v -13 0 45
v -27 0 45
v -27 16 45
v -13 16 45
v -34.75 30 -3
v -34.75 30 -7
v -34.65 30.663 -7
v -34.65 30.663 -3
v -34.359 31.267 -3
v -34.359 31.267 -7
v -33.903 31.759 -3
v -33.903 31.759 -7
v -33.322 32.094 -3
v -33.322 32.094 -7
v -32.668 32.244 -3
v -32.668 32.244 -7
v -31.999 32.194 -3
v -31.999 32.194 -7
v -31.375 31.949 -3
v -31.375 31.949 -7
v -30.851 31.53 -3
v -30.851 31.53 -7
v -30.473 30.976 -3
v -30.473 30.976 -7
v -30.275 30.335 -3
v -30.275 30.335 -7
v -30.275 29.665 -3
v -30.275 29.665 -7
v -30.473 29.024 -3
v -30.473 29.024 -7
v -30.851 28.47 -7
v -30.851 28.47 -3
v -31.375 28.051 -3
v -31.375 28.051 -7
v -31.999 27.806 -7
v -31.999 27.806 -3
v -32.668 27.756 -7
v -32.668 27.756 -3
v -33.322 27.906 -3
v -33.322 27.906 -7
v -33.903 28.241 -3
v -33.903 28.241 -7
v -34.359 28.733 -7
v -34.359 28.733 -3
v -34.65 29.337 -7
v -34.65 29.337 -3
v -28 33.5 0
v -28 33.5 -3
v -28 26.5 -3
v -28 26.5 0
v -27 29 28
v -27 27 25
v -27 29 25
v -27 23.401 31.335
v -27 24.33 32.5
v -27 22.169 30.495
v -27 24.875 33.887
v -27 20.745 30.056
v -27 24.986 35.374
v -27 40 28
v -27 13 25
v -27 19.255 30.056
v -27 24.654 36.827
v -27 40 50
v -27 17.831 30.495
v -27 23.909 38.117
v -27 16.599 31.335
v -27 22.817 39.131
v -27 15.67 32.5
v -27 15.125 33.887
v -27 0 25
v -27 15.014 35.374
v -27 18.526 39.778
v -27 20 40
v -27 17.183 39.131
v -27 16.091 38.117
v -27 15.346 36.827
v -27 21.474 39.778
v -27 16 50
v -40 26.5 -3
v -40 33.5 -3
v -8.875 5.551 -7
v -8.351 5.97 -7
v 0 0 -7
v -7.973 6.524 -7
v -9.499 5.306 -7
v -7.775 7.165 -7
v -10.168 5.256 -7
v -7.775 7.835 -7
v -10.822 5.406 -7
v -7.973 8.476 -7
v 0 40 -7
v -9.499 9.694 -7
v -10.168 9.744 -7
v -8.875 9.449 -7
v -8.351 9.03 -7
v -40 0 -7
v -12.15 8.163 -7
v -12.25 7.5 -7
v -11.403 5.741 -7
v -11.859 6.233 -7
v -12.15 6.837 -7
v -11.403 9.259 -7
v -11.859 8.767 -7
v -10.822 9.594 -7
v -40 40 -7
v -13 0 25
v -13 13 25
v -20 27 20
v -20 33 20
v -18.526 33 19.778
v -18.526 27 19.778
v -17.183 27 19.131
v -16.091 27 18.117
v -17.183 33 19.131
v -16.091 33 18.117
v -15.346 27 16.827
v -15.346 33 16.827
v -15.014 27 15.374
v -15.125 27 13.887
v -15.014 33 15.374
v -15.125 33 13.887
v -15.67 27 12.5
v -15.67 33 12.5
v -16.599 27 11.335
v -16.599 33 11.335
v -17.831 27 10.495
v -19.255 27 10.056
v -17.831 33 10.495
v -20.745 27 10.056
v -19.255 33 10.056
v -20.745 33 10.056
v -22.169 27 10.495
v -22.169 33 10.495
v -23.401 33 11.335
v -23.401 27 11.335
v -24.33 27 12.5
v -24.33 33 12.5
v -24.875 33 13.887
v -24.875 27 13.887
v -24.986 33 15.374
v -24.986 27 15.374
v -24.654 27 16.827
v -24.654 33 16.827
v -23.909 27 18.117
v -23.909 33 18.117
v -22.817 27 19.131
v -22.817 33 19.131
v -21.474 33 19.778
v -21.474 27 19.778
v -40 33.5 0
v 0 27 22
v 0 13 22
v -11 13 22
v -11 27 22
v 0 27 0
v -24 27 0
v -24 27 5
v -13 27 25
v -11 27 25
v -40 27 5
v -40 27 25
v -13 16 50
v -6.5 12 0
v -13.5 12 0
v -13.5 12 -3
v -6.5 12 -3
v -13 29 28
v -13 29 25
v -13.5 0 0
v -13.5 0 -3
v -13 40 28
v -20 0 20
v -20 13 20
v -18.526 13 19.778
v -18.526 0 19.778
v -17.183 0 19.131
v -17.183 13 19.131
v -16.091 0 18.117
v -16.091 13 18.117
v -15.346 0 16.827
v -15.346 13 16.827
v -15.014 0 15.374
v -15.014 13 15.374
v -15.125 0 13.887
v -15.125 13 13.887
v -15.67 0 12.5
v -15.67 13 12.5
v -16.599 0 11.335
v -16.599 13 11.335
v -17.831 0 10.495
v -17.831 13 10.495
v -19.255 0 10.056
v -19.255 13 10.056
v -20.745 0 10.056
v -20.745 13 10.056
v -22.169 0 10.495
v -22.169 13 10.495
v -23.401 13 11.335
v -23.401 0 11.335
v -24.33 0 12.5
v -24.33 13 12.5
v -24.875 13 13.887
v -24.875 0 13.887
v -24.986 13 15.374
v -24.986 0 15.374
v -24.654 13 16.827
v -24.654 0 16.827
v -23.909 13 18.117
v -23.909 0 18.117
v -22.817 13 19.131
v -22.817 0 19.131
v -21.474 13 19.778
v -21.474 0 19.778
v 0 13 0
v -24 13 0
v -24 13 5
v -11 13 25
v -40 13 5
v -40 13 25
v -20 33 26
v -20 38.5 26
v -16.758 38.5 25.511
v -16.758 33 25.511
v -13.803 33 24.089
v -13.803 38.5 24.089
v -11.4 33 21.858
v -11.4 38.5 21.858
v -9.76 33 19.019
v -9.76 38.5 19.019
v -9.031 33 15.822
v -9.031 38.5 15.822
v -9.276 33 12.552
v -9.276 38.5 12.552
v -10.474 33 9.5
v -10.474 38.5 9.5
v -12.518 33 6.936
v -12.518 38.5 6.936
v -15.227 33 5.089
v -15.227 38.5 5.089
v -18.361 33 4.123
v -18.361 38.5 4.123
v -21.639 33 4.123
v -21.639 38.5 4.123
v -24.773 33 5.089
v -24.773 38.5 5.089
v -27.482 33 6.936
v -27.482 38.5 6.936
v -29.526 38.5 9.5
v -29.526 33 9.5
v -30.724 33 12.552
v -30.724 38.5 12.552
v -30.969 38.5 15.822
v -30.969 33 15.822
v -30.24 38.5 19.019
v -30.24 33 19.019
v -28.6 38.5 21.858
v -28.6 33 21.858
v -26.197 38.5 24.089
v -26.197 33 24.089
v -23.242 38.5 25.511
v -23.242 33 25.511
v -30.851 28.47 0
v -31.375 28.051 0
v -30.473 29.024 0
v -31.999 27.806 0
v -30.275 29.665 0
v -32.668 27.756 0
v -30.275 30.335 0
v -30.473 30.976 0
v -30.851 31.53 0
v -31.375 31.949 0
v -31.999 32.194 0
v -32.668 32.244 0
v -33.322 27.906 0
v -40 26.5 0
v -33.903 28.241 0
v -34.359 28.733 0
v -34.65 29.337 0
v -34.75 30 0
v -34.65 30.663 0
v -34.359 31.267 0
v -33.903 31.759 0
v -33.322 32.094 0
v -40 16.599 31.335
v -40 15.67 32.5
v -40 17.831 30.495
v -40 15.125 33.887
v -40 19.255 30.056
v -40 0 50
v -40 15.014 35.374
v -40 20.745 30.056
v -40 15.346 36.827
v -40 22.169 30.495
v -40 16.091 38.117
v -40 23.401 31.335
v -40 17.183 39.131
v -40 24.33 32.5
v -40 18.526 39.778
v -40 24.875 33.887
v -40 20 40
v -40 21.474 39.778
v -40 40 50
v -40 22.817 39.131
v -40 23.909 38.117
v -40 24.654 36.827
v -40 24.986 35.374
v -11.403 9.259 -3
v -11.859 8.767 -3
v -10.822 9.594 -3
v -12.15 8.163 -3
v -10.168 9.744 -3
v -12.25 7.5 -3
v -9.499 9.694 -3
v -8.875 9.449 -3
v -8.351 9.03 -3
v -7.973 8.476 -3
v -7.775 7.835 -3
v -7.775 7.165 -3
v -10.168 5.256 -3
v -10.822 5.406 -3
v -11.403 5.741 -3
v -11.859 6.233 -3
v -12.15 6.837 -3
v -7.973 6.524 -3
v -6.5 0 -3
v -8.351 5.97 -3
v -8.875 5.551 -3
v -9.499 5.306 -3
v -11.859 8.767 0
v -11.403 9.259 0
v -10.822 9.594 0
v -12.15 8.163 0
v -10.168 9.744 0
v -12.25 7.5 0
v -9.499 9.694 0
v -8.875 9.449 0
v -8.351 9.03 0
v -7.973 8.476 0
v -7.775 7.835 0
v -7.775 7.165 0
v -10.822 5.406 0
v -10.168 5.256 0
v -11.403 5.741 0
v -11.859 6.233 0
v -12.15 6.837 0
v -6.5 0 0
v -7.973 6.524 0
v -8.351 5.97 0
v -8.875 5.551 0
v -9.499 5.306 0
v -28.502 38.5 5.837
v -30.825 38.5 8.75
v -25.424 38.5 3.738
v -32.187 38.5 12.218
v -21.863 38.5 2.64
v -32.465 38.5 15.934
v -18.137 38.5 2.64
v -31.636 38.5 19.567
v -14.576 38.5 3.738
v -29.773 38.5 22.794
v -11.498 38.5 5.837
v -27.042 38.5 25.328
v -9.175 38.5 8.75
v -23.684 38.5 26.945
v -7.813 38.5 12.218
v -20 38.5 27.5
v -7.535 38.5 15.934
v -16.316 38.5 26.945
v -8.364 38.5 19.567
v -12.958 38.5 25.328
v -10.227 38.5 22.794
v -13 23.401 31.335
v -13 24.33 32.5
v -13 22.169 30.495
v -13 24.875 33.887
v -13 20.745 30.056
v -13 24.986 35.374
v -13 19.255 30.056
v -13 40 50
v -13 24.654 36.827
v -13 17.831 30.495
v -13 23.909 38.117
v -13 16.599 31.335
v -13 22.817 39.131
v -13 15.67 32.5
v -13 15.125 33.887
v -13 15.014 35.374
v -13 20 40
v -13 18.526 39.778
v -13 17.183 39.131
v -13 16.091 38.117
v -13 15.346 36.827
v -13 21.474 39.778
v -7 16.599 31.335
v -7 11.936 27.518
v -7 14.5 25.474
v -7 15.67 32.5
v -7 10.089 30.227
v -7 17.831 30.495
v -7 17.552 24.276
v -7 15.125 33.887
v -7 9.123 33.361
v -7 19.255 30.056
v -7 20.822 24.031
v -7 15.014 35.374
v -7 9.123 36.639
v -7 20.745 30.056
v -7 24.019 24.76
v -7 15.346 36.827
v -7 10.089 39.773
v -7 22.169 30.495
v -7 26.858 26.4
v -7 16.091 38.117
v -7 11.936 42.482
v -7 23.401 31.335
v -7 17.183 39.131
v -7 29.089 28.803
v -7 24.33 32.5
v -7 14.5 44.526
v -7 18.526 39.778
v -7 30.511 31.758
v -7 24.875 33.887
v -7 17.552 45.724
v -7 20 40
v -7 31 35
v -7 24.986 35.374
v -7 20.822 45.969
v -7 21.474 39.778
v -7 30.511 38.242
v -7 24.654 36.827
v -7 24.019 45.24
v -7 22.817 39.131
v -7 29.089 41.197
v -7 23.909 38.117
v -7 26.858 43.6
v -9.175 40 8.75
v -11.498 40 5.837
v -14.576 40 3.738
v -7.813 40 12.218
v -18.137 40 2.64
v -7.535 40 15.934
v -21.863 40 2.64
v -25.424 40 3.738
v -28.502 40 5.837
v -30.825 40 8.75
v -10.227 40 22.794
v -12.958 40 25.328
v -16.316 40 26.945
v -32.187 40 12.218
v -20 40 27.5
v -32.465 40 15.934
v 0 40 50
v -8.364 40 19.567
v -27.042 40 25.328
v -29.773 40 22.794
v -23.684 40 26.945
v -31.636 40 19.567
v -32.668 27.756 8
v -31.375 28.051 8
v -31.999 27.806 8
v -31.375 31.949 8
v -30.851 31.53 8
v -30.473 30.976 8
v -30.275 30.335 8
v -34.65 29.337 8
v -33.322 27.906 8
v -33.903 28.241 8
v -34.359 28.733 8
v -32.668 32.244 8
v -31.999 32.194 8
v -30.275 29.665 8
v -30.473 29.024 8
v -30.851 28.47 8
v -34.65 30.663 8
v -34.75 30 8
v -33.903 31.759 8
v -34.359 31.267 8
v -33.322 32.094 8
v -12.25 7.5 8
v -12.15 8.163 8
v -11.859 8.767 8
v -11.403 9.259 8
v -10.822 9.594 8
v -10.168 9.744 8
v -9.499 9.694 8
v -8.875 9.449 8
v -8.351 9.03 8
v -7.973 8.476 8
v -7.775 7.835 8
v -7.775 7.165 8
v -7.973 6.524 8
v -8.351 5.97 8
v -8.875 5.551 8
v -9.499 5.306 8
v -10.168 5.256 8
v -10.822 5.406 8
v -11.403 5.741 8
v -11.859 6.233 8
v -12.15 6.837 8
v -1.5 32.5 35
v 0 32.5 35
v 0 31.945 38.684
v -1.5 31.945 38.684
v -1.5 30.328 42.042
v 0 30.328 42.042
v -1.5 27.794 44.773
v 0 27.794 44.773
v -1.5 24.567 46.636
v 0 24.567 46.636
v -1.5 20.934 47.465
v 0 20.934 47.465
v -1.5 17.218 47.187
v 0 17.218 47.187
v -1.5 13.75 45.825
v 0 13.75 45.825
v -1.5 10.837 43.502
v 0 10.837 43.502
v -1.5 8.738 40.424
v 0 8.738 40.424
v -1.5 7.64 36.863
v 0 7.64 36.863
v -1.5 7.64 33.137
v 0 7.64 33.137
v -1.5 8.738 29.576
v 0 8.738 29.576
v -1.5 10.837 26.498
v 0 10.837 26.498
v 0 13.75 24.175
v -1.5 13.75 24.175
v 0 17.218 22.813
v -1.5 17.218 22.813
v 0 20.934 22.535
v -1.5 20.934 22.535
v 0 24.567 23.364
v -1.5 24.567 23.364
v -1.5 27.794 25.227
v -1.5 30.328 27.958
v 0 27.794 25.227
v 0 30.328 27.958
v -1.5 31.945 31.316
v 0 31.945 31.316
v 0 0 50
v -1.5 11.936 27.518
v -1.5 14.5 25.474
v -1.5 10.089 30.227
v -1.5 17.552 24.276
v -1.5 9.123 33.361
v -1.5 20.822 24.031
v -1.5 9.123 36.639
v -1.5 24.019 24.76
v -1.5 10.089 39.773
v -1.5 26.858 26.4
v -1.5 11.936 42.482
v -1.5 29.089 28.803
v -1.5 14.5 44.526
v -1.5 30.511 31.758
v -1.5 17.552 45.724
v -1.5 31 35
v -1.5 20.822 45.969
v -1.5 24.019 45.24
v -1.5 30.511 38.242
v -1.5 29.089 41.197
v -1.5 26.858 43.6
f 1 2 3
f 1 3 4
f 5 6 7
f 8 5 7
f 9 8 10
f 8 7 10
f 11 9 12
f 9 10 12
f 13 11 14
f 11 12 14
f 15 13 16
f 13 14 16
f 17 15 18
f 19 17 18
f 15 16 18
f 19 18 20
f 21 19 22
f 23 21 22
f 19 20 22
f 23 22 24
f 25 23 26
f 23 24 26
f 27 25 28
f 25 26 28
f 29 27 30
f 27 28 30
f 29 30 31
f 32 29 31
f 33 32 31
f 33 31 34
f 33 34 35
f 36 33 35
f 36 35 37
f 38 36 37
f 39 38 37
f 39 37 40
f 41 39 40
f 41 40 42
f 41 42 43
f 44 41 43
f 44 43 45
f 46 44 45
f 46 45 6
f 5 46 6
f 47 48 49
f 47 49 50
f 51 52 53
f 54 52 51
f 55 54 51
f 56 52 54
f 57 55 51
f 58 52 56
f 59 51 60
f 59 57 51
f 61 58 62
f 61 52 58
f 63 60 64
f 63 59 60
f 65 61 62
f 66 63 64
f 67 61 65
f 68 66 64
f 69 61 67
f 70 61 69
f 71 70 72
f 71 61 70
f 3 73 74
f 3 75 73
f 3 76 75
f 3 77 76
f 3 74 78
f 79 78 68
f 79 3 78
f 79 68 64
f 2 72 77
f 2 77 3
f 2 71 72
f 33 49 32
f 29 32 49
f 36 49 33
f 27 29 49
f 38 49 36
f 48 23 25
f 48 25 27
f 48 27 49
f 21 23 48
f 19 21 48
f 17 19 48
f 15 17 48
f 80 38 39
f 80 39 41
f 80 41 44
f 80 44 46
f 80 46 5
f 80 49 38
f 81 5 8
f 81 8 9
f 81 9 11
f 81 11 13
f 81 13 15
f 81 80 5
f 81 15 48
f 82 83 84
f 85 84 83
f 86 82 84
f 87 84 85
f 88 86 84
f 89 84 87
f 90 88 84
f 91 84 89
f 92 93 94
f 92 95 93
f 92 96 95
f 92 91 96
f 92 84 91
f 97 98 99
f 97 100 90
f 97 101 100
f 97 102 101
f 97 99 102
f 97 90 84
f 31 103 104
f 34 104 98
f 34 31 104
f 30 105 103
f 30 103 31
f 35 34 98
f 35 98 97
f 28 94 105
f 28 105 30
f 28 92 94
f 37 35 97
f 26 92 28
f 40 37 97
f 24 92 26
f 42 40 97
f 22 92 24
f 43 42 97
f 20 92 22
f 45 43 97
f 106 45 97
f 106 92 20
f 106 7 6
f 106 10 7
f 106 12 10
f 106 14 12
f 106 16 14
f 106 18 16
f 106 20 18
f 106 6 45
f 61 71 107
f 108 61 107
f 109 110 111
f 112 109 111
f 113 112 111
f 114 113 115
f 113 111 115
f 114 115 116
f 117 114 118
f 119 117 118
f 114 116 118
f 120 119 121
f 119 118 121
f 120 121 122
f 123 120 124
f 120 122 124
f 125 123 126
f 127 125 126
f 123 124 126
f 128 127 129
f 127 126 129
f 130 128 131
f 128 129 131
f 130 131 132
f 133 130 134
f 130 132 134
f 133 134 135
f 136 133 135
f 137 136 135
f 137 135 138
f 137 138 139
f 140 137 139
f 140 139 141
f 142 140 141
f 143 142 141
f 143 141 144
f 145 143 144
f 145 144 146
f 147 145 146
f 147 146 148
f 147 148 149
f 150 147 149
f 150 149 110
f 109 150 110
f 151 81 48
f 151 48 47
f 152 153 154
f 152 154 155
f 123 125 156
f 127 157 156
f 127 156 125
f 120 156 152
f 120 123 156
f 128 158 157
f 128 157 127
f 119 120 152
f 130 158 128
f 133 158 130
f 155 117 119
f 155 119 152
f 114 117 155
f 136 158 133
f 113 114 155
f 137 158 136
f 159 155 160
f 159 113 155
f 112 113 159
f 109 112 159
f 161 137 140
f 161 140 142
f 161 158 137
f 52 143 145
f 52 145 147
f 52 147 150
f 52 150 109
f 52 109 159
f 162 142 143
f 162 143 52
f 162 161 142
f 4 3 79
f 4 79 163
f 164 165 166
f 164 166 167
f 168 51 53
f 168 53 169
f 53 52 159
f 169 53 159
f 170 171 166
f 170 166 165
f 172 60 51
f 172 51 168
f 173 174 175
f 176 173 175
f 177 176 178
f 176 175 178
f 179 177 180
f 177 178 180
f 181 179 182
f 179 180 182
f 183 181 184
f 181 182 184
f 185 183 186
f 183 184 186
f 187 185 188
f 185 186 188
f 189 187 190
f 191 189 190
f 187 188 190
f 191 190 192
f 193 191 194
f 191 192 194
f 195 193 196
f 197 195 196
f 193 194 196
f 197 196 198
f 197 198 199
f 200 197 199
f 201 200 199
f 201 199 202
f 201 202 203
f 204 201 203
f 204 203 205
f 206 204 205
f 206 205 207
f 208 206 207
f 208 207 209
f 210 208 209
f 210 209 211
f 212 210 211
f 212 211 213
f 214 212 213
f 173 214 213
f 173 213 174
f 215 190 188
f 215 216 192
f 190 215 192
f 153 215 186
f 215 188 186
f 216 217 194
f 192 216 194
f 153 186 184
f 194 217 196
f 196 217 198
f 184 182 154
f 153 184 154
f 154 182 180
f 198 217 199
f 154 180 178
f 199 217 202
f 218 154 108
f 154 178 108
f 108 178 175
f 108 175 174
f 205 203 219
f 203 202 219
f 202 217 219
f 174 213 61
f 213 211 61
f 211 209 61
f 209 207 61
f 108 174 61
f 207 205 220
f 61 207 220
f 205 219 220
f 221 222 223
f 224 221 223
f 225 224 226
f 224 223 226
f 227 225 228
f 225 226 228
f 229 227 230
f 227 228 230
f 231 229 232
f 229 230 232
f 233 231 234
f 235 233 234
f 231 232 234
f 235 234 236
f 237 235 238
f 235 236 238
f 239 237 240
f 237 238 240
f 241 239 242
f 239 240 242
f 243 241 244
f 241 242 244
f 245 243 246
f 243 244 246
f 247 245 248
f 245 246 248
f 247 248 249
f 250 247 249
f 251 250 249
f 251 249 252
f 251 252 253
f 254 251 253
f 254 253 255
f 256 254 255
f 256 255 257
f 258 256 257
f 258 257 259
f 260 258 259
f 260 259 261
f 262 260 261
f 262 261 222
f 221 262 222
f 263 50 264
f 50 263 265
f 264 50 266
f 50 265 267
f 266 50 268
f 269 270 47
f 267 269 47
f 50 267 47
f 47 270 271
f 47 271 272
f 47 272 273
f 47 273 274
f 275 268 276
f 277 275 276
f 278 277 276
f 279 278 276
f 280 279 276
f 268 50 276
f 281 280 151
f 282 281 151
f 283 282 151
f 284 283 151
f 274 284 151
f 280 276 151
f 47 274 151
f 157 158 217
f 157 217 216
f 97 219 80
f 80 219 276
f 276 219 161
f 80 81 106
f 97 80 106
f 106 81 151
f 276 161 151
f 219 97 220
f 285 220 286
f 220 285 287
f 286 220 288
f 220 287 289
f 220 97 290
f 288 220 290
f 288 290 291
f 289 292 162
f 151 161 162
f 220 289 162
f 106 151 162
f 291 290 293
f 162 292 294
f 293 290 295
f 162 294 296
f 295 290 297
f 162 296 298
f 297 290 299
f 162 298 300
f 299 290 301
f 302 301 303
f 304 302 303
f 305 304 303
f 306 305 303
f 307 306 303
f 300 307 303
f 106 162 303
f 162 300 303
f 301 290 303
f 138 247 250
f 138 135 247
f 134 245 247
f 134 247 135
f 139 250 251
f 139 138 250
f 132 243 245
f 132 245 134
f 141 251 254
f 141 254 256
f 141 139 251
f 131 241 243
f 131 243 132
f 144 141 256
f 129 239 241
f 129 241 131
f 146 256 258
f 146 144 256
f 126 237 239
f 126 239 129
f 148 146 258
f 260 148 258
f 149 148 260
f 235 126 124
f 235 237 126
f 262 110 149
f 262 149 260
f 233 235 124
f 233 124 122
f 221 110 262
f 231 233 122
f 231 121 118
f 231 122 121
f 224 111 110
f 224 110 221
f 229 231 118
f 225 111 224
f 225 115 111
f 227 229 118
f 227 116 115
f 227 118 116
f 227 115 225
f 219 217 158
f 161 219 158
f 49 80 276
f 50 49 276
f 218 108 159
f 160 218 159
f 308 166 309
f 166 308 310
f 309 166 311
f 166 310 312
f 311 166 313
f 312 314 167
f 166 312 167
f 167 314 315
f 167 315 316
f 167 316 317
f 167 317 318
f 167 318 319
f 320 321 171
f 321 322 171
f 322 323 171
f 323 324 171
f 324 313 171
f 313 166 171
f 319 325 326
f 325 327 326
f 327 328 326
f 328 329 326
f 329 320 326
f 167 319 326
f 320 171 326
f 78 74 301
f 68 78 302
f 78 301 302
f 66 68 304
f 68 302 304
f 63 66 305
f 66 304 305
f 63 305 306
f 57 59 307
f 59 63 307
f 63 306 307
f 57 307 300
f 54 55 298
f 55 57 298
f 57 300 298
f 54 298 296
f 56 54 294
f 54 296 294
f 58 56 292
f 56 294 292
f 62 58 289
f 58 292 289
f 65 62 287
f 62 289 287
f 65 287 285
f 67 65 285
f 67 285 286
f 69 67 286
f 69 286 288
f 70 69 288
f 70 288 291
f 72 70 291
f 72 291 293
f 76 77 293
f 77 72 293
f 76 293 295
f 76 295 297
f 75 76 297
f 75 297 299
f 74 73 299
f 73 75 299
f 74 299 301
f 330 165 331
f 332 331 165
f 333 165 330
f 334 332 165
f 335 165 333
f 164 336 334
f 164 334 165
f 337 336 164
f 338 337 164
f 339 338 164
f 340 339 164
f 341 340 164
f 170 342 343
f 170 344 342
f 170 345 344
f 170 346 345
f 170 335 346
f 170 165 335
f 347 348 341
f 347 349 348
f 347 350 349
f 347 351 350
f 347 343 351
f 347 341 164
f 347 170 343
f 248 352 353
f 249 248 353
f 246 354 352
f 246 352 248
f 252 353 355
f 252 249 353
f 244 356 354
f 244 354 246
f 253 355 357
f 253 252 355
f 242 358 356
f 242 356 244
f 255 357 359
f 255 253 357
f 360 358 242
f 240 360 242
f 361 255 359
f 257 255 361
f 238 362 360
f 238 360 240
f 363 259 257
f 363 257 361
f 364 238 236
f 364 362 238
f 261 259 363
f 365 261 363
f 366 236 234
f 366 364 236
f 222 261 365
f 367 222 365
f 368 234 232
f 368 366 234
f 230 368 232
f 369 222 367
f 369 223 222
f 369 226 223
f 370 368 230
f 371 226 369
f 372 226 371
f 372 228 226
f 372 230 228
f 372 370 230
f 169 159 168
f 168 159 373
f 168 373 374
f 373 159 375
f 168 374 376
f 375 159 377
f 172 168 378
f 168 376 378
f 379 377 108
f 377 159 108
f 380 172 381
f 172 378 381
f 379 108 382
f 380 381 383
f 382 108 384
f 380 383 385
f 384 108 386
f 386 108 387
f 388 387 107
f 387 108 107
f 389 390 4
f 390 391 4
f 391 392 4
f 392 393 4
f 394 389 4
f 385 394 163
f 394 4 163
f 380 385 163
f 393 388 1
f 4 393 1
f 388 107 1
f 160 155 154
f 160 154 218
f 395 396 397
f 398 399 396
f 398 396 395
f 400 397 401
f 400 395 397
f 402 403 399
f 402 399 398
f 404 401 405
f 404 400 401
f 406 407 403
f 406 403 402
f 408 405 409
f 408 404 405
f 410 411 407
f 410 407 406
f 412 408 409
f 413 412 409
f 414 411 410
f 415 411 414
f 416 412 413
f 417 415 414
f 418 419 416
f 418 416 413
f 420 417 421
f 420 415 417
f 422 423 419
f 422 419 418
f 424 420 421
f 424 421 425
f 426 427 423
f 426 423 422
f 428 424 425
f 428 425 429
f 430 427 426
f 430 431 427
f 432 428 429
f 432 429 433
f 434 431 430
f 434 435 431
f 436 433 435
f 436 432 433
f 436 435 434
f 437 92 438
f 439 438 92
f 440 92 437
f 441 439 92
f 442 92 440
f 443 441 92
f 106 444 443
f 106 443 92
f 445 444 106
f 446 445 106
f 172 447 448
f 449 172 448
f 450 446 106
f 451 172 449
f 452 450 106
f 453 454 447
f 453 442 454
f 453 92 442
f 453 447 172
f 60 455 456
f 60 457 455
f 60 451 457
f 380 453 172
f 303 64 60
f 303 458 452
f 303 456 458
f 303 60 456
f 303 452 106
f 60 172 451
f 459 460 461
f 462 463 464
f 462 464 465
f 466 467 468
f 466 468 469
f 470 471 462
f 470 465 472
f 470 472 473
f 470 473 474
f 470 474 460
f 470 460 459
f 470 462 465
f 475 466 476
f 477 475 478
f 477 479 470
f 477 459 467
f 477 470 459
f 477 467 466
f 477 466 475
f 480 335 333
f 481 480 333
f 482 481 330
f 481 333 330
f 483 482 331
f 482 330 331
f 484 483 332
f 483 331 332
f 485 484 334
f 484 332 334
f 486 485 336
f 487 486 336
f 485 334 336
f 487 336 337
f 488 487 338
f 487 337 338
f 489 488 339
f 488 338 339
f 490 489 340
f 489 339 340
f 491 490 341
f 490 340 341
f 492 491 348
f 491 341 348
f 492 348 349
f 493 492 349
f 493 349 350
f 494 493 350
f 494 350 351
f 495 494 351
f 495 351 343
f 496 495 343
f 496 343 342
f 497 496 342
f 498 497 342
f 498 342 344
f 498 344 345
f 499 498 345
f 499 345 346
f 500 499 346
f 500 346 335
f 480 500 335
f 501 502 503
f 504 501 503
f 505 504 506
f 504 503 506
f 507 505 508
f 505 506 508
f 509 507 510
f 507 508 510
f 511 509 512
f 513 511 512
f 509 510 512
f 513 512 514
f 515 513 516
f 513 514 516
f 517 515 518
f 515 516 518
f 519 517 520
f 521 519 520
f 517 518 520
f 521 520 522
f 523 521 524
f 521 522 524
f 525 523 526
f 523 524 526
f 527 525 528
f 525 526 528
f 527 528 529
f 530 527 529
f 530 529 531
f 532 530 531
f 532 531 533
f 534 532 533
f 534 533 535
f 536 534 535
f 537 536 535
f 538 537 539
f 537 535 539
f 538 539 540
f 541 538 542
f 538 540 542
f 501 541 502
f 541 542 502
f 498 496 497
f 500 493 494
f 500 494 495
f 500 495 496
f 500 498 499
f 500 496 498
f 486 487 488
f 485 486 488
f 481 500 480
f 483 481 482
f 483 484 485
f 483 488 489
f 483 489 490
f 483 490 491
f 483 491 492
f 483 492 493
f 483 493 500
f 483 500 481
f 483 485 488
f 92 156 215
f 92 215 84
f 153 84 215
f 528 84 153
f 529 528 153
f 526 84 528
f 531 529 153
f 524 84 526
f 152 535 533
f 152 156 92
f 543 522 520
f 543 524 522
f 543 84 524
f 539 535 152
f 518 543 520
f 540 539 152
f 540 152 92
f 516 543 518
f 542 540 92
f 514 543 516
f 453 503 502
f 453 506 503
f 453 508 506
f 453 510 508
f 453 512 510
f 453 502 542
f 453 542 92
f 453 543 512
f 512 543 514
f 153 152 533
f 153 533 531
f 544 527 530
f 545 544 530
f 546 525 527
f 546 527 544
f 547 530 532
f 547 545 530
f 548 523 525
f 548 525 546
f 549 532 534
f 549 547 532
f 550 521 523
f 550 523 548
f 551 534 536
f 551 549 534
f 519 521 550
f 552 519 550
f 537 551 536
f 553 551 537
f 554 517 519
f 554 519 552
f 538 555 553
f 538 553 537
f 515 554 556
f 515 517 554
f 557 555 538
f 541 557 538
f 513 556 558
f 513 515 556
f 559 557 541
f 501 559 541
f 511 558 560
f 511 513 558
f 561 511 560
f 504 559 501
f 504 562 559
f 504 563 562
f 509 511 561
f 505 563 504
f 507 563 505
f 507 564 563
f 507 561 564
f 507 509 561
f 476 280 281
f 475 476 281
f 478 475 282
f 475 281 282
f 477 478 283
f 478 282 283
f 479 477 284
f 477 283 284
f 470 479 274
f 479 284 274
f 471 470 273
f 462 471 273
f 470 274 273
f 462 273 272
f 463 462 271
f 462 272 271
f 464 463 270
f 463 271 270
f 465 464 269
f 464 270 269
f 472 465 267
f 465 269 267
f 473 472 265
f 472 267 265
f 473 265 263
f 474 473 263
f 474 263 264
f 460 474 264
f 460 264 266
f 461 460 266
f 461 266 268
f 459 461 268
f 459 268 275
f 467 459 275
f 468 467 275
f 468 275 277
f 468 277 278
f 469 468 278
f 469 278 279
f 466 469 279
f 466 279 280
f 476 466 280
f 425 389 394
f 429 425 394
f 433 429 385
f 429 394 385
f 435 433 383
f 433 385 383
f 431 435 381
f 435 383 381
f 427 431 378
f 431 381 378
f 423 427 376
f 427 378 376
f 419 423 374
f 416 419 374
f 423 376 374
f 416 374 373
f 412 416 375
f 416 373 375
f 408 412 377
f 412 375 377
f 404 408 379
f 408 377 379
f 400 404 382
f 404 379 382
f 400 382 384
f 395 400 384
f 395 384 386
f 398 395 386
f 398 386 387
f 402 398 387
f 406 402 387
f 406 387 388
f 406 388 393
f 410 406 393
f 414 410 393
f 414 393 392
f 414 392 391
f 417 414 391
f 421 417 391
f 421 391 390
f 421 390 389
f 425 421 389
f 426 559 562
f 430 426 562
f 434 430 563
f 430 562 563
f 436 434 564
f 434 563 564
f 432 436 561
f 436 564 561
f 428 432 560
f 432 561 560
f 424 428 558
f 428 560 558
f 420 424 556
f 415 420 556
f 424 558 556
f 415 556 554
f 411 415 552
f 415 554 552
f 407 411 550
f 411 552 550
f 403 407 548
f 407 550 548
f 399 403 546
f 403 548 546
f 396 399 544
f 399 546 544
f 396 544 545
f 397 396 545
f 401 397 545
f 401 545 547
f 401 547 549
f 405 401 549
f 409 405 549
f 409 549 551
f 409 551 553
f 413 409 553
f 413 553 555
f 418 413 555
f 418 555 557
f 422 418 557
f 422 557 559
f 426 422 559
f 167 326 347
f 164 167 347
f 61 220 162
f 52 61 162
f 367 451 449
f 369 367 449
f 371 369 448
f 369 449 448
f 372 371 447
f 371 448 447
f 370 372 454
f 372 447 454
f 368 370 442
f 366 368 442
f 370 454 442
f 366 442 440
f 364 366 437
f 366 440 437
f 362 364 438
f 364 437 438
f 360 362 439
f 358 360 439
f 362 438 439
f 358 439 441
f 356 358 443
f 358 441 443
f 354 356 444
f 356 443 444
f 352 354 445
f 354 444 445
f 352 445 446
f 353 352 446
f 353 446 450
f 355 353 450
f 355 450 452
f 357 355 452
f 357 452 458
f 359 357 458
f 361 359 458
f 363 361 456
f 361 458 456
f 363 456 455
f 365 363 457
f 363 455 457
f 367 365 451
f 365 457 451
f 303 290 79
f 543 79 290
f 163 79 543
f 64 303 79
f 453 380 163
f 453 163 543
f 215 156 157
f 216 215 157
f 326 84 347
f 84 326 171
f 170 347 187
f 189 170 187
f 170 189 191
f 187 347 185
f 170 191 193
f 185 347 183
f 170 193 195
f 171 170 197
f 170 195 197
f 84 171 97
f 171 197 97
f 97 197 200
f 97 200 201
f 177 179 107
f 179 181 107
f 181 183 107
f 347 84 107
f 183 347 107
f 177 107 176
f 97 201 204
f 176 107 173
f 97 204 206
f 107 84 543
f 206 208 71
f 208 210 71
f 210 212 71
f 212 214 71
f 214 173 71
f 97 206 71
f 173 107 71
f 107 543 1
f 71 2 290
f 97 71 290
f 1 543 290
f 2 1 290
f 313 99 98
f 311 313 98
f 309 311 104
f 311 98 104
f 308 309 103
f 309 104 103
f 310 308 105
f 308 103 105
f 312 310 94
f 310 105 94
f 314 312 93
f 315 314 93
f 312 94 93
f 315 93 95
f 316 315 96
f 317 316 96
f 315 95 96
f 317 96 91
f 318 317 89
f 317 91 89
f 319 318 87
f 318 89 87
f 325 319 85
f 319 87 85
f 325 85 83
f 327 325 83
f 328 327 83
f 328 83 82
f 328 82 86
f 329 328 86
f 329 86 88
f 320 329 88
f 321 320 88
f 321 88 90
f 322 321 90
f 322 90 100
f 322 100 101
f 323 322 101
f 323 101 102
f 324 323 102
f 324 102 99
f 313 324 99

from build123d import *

# Parameters (mm, degrees)
ESQUISSE1_W              = 40
ESQUISSE1_H              = 40
BOSS_EXTRU_1_DEPTH       = 50
ESQUISSE2_R              = 5
ENL_V_MAT_EXTRU_1_DEPTH  = 41
ESQUISSE3_R              = 5
ENL_V_MAT_EXTRU_2_DEPTH  = 41
ESQUISSE4_W              = 20
ESQUISSE4_H              = 14
ENL_V_MAT_EXTRU_3_DEPTH  = 29
ESQUISSE5_W              = 14
ESQUISSE5_H              = 20
ENL_V_MAT_EXTRU_4_DEPTH  = 29
ESQUISSE6_W              = 22
ESQUISSE6_H              = 14
ENL_V_MAT_EXTRU_5_DEPTH  = 24
ESQUISSE7_W              = 14
ESQUISSE7_H              = 22
ENL_V_MAT_EXTRU_6_DEPTH  = 24
ESQUISSE8_R              = 11
ENL_V_MAT_EXTRU_7_DEPTH  = 7
ESQUISSE9_R              = 12.5
ENL_V_MAT_EXTRU_8_DEPTH  = 1.5
ESQUISSE10_R             = 11
ENL_V_MAT_EXTRU_9_DEPTH  = 7
ESQUISSE11_R             = 12.5
ENL_V_MAT_EXTRU_10_DEPTH = 1.5
ESQUISSE12_W             = 40
ESQUISSE12_H             = 40
BOSS_EXTRU_2_DEPTH       = 7
ESQUISSE13_R             = 2.25
ENL_V_MAT_EXTRU_11_DEPTH = 15
ESQUISSE14_W             = 3
ESQUISSE14_H             = 7
ENL_V_MAT_EXTRU_12_DEPTH = 12
ESQUISSE15_W             = 7
ESQUISSE15_H             = 3
ENL_V_MAT_EXTRU_13_DEPTH = 12


with BuildPart() as part:
    # Esquisse1 → Boss.-Extru.1 (new body)
    with BuildSketch(Plane.XY):
        with Locations((-20, 20)):
            Rectangle(ESQUISSE1_W, ESQUISSE1_H)
    extrude(amount=BOSS_EXTRU_1_DEPTH)

    # Esquisse2 → Enlèv. mat.-Extru.1 (cut, through all)
    with BuildSketch(Plane(origin=(0, 40, 0), x_dir=(1, 0, 0), z_dir=(0, 1, 0))):
        with Locations(Location((-20, -15, 0), (0, 0, 270))):  # turned: the seam where the file's is
            Circle(ESQUISSE2_R)
    extrude(amount=-ENL_V_MAT_EXTRU_1_DEPTH, mode=Mode.SUBTRACT)

    # Esquisse3 → Enlèv. mat.-Extru.2 (cut, through all)
    with BuildSketch(Plane.ZY.offset(40)):
        with Locations((35, 20)):
            Circle(ESQUISSE3_R)
    extrude(amount=-ENL_V_MAT_EXTRU_2_DEPTH, mode=Mode.SUBTRACT)

    # Esquisse4 → Enlèv. mat.-Extru.3 (cut)
    with BuildSketch(Plane.ZY.offset(40)):
        with Locations((15, 20)):
            Rectangle(ESQUISSE4_W, ESQUISSE4_H)
    extrude(amount=-ENL_V_MAT_EXTRU_3_DEPTH, mode=Mode.SUBTRACT)

    # Esquisse5 → Enlèv. mat.-Extru.4 (cut)
    with BuildSketch(Plane.XZ):
        with Locations((-20, 35)):
            Rectangle(ESQUISSE5_W, ESQUISSE5_H)
    extrude(amount=-ENL_V_MAT_EXTRU_4_DEPTH, mode=Mode.SUBTRACT)

    # Esquisse6 → Enlèv. mat.-Extru.5 (cut)
    with BuildSketch(Plane(origin=(0, 0, 0), x_dir=(0, 0, -1), z_dir=(1, 0, 0))):
        with Locations((-11, 20)):
            Rectangle(ESQUISSE6_W, ESQUISSE6_H)
    extrude(amount=-ENL_V_MAT_EXTRU_5_DEPTH, mode=Mode.SUBTRACT)

    # Esquisse7 → Enlèv. mat.-Extru.6 (cut)
    with BuildSketch(Plane(origin=(0, 40, 0), x_dir=(1, 0, 0), z_dir=(0, 1, 0))):
        with Locations((-20, -39)):
            Rectangle(ESQUISSE7_W, ESQUISSE7_H)
    extrude(amount=-ENL_V_MAT_EXTRU_6_DEPTH, mode=Mode.SUBTRACT)

    # Esquisse8 → Enlèv. mat.-Extru.7 (cut)
    with BuildSketch(Plane(origin=(0, 0, 0), x_dir=(0, 0, -1), z_dir=(1, 0, 0))):
        with Locations(Location((-35, 20, 0), (0, 0, 90))):  # turned: the seam where the file's is
            Circle(ESQUISSE8_R)
    extrude(amount=-ENL_V_MAT_EXTRU_7_DEPTH, mode=Mode.SUBTRACT)

    # Esquisse9 → Enlèv. mat.-Extru.8 (cut)
    with BuildSketch(Plane(origin=(0, 0, 0), x_dir=(0, 0, -1), z_dir=(1, 0, 0))):
        with Locations(Location((-35, 20, 0), (0, 0, 90))):  # turned: the seam where the file's is
            Circle(ESQUISSE9_R)
    extrude(amount=-ENL_V_MAT_EXTRU_8_DEPTH, mode=Mode.SUBTRACT)

    # Esquisse10 → Enlèv. mat.-Extru.9 (cut)
    with BuildSketch(Plane(origin=(0, 40, 0), x_dir=(1, 0, 0), z_dir=(0, 1, 0))):
        with Locations(Location((-20, -15, 0), (0, 0, 270))):  # turned: the seam where the file's is
            Circle(ESQUISSE10_R)
    extrude(amount=-ENL_V_MAT_EXTRU_9_DEPTH, mode=Mode.SUBTRACT)

    # Esquisse11 → Enlèv. mat.-Extru.10 (cut)
    with BuildSketch(Plane(origin=(0, 40, 0), x_dir=(1, 0, 0), z_dir=(0, 1, 0))):
        with Locations(Location((-20, -15, 0), (0, 0, 270))):  # turned: the seam where the file's is
            Circle(ESQUISSE11_R)
    extrude(amount=-ENL_V_MAT_EXTRU_10_DEPTH, mode=Mode.SUBTRACT)

    # Esquisse12 → Boss.-Extru.2 (add)
    with BuildSketch(Plane(origin=(0, 0, 0), x_dir=(-1, 0, 0), z_dir=(0, 0, -1))):
        with Locations((20, 20)):
            Rectangle(ESQUISSE12_W, ESQUISSE12_H)
    extrude(amount=BOSS_EXTRU_2_DEPTH)

    # Esquisse13 → Enlèv. mat.-Extru.11 (cut)
    with BuildSketch(Plane(origin=(0, 0, -7), x_dir=(-1, 0, 0), z_dir=(0, 0, -1))):
        with Locations((10, 7.5)):
            Circle(ESQUISSE13_R)
        with Locations((32.5, 30)):
            Circle(ESQUISSE13_R)
    extrude(amount=-ENL_V_MAT_EXTRU_11_DEPTH, mode=Mode.SUBTRACT)

    # Esquisse14 → Enlèv. mat.-Extru.12 (cut)
    with BuildSketch(Plane.ZY.offset(40)):
        with Locations((-1.5, 30)):
            Rectangle(ESQUISSE14_W, ESQUISSE14_H)
    extrude(amount=-ENL_V_MAT_EXTRU_12_DEPTH, mode=Mode.SUBTRACT)

    # Esquisse15 → Enlèv. mat.-Extru.13 (cut)
    with BuildSketch(Plane.XZ):
        with Locations((-10, -1.5)):
            Rectangle(ESQUISSE15_W, ESQUISSE15_H)
    extrude(amount=-ENL_V_MAT_EXTRU_13_DEPTH, mode=Mode.SUBTRACT)


solid = part.part
